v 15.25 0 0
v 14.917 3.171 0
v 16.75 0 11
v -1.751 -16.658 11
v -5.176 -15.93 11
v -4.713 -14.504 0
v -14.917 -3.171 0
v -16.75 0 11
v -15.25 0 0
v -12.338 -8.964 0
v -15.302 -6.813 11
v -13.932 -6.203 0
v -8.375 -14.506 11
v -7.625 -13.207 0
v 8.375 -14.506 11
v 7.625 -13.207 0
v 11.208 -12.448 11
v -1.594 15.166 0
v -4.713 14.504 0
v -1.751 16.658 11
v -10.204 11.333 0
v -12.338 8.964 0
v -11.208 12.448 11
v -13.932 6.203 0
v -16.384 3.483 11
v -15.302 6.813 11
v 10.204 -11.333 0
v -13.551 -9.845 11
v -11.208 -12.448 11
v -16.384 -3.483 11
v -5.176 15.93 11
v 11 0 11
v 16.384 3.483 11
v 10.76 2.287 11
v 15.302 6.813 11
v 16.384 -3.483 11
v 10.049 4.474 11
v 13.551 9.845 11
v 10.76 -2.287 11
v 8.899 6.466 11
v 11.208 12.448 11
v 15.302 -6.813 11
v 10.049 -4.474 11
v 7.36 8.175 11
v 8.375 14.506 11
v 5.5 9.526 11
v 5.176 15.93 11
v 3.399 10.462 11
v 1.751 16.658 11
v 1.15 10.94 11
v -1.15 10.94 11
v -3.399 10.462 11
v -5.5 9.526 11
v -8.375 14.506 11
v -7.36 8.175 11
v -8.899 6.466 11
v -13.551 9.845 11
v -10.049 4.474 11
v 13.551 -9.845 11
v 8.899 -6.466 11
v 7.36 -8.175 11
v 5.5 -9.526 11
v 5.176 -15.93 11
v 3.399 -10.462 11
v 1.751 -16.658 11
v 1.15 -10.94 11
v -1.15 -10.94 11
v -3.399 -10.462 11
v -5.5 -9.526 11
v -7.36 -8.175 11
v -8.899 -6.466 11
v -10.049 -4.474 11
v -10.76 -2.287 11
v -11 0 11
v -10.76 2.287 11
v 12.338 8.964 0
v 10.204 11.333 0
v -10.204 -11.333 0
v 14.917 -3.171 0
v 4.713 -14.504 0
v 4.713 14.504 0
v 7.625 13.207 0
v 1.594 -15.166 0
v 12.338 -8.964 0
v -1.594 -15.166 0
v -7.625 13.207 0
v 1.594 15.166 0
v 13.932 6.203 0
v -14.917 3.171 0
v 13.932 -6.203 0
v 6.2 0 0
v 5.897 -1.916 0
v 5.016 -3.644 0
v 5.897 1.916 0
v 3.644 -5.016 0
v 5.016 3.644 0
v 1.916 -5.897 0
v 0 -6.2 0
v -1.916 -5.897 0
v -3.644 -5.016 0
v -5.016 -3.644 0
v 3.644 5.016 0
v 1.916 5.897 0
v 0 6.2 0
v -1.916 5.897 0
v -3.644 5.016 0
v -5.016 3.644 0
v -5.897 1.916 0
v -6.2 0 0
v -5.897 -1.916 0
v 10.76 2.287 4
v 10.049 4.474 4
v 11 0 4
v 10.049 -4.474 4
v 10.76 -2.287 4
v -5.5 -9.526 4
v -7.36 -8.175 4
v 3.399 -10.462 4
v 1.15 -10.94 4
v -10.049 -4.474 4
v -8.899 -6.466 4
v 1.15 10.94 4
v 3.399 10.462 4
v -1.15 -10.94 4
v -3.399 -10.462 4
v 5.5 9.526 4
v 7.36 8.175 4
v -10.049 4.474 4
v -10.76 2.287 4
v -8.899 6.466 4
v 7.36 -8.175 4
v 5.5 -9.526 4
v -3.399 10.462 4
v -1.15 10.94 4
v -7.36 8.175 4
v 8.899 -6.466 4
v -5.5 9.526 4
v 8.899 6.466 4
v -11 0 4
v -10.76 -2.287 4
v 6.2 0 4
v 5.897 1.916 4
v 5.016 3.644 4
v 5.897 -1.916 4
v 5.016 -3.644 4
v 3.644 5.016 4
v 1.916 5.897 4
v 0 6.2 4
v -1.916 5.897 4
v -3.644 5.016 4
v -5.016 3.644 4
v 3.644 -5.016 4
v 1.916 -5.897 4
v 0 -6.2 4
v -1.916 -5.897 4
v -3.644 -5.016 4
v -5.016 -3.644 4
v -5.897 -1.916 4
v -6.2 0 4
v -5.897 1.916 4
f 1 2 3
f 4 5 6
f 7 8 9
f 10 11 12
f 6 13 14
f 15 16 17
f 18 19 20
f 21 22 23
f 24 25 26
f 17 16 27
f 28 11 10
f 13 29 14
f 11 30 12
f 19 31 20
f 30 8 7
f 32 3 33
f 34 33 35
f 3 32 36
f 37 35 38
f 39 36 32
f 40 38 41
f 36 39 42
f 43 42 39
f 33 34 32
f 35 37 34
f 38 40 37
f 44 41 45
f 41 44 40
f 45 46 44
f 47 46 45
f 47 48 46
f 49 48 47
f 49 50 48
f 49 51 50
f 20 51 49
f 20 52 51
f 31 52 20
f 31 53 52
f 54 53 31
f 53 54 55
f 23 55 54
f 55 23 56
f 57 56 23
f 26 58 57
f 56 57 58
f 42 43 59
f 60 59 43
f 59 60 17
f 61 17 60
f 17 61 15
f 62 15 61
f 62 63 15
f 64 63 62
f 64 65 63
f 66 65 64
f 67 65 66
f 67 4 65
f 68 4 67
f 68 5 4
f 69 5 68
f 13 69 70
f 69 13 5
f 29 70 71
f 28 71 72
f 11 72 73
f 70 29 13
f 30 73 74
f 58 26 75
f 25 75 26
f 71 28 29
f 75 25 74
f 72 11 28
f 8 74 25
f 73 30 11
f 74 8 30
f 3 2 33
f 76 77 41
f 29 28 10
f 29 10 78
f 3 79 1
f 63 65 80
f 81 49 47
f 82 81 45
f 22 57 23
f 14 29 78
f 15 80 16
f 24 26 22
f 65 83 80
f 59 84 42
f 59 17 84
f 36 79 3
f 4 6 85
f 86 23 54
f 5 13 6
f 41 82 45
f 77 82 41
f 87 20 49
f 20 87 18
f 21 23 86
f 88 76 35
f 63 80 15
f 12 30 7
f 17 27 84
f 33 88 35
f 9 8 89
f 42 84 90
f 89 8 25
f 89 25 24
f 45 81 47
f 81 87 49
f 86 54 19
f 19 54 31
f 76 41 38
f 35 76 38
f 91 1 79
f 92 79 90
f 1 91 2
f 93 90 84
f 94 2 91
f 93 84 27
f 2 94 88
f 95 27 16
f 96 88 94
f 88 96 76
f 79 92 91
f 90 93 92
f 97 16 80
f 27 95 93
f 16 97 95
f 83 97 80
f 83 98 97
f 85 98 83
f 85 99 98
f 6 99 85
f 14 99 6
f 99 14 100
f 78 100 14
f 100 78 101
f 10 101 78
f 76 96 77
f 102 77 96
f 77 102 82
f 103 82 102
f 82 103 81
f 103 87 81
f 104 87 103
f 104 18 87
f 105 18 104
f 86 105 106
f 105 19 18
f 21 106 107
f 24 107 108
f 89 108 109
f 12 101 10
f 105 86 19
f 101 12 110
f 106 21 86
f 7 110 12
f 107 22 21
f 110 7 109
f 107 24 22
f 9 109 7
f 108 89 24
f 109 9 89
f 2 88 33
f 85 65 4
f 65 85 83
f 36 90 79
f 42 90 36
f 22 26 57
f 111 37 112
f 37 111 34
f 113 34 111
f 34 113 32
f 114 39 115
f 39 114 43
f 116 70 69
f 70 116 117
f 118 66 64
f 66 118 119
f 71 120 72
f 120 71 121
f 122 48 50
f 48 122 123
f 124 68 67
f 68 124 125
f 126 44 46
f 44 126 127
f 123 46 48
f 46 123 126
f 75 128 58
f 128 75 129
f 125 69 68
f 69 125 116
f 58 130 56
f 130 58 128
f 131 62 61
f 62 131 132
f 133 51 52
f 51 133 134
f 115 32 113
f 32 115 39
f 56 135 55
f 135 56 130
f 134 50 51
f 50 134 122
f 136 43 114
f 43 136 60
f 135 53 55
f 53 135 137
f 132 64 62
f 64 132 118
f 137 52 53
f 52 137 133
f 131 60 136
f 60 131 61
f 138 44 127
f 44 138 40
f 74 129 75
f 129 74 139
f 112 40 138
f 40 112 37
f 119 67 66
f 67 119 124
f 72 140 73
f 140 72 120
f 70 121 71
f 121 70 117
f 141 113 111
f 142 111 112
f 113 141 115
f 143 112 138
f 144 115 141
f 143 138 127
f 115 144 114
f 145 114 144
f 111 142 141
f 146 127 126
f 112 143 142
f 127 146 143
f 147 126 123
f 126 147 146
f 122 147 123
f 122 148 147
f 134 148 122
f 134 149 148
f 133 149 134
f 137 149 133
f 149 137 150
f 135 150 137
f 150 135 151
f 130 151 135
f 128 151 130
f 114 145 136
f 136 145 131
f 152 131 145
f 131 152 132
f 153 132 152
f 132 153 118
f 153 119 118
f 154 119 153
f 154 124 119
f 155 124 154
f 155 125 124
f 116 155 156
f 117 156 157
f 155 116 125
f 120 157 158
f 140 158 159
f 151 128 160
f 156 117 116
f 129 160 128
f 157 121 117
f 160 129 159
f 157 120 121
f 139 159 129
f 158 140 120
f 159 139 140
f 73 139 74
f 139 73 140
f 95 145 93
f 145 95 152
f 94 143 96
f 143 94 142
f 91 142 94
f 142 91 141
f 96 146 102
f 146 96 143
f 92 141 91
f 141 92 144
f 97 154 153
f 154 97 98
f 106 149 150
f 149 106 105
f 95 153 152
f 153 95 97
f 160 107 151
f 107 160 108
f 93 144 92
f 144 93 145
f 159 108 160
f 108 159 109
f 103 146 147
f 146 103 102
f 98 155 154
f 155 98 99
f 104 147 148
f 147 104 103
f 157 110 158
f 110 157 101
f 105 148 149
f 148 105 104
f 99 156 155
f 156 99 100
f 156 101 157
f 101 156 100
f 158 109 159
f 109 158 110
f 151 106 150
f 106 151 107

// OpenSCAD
//By Dan Finlay, 2013
//dan@danfinlay.com

bearing_outer_diameter = 22;
bearing_width = 7;
bearing_hole_diameter = 8;

spool_diameter = 32;

wedge_difference = 1.5;

module bearing_hole(){
	translate([0,0,4])
	cylinder(r=bearing_outer_diameter/2, h=bearing_width);
}

module axle_hole(){
	cylinder(r=(bearing_hole_diameter/2)+2.2, h=bearing_width*2);
}

module main_area(){
	union(){
		difference(){
			cylinder(r1=(spool_diameter/2)-(wedge_difference/2), r2=(spool_diameter/2)+(wedge_difference/2), h=bearing_width+4);
			translate([0,0,4]) cylinder(r1=(spool_diameter/2)-5-(wedge_difference/2), r2=(spool_diameter/2)-5+(wedge_difference/2), h=bearing_width);
		}
		translate([0,0,4])
			cylinder(r=(bearing_outer_diameter/2)+3, h=bearing_width);
	}
}

difference(){
	main_area();
	bearing_hole();
	axle_hole();
}
